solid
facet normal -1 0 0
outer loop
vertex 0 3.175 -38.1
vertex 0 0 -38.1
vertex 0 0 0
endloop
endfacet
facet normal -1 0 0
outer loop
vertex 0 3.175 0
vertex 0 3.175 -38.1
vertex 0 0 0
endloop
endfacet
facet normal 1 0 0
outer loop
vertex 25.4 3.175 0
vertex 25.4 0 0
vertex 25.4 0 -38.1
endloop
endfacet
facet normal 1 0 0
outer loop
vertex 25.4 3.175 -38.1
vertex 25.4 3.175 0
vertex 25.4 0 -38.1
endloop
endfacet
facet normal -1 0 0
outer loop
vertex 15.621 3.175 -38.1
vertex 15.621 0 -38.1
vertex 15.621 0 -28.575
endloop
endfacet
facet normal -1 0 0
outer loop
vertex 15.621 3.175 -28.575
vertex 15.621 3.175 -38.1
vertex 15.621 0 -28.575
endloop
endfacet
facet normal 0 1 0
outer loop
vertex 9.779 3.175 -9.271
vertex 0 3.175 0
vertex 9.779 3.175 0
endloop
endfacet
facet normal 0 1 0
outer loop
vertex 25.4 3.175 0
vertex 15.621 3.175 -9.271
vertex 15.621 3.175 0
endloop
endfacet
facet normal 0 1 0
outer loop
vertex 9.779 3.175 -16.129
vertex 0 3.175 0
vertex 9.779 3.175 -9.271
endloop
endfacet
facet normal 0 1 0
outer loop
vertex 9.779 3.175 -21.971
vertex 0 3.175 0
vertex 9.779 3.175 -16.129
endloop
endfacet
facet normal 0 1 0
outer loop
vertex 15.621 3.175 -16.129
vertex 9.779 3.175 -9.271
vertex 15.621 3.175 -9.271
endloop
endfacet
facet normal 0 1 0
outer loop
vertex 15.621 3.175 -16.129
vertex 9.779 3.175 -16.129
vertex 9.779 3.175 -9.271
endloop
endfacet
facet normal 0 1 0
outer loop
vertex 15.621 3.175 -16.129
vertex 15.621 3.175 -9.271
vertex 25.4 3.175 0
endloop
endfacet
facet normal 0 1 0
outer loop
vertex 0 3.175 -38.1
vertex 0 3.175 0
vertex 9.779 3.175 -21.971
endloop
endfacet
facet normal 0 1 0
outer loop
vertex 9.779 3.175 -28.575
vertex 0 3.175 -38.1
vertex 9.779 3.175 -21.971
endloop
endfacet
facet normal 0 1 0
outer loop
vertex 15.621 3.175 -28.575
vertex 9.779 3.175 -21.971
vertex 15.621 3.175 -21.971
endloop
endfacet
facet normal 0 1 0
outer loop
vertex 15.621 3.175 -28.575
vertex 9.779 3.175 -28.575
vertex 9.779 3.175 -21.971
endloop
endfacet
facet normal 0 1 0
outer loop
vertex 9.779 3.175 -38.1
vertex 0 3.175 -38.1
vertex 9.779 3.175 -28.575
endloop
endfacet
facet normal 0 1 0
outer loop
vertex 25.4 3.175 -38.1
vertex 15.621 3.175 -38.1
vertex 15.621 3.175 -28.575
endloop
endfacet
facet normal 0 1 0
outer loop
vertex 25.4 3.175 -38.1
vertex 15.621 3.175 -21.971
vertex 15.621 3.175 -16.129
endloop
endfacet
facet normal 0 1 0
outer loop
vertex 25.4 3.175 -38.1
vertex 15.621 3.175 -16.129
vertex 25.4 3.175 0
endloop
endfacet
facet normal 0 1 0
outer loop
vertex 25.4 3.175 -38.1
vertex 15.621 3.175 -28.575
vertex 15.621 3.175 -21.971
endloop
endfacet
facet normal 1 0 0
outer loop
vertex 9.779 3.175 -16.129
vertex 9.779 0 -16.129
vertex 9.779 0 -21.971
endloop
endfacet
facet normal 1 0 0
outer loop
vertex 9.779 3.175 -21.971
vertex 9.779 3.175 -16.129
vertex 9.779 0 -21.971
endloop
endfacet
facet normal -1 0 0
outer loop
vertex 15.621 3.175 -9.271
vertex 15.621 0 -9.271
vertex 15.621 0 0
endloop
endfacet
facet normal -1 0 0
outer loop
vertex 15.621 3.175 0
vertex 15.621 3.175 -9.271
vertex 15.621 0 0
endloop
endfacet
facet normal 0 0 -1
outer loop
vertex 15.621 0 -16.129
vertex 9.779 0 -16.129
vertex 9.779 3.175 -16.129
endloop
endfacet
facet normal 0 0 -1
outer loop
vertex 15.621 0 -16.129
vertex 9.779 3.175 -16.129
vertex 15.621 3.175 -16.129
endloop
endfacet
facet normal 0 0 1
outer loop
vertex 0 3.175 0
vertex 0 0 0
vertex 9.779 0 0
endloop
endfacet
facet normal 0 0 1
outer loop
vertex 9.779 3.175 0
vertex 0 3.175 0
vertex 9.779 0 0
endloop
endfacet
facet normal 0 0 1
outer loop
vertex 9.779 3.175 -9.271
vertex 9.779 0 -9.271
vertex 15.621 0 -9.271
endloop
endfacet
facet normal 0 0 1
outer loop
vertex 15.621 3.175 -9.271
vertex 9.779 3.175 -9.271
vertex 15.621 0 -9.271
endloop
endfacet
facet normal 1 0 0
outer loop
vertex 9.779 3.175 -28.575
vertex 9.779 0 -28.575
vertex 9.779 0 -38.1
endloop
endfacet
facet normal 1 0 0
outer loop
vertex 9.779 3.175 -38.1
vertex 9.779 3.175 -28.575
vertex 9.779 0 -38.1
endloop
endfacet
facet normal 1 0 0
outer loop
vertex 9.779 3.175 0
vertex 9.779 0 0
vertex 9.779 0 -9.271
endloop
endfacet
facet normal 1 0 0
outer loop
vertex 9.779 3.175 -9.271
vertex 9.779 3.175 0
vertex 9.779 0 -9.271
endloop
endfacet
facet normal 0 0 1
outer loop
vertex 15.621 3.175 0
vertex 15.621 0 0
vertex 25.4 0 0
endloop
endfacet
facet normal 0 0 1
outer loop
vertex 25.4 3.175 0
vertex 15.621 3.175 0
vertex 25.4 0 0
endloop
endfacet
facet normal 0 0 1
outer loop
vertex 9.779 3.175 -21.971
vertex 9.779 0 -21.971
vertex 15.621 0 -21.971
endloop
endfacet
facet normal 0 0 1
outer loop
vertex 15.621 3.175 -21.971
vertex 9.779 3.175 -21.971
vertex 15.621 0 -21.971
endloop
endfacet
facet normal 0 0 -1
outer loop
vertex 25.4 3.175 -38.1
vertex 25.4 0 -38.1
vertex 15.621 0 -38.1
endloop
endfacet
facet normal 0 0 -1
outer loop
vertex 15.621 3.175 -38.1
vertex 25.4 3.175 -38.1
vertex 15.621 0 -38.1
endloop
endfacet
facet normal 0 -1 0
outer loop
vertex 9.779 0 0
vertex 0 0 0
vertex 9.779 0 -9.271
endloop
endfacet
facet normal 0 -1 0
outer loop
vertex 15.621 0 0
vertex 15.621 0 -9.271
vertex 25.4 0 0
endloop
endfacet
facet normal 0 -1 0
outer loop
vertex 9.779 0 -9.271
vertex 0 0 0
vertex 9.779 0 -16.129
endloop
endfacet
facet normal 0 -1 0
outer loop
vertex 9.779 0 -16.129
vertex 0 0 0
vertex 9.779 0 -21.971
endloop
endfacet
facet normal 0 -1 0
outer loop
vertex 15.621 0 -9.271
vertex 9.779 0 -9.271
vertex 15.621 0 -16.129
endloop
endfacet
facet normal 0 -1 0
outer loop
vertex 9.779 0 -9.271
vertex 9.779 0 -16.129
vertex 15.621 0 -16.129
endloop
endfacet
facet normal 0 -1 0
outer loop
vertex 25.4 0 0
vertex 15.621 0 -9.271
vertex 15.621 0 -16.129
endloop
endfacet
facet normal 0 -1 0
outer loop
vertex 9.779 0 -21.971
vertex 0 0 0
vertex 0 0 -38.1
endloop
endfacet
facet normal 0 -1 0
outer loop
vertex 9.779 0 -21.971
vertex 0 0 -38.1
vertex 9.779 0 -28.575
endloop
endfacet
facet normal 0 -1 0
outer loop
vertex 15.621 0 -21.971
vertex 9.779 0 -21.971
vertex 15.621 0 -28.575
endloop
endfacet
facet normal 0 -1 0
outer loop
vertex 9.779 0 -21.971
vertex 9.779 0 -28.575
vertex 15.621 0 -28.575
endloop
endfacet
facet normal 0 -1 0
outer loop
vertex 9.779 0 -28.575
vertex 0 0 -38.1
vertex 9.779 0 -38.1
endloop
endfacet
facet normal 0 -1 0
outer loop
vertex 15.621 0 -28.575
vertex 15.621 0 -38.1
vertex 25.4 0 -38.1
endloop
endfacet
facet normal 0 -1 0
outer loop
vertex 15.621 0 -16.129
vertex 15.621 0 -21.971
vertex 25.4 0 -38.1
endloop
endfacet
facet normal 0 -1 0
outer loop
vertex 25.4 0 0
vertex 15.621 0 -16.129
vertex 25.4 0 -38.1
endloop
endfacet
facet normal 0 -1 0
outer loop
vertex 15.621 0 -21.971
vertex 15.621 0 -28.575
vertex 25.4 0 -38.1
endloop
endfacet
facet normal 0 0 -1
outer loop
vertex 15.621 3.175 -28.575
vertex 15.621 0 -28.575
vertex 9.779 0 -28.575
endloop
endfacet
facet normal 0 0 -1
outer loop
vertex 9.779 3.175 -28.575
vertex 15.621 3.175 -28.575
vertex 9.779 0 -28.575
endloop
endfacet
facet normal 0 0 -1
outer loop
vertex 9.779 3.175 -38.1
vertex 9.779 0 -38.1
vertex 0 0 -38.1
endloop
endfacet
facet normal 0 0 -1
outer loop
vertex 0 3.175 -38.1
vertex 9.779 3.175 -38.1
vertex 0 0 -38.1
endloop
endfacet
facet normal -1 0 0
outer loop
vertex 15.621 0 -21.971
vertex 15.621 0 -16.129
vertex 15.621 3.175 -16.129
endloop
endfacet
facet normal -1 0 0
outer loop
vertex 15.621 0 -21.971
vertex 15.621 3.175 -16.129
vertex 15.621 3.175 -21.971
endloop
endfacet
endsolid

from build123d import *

# Parameters (mm, degrees)
SKETCH1_W           = 5.842
SKETCH1_H           = 5.842
BOSS_EXTRUDE1_DEPTH = 3.175


with BuildPart() as part:
    # Sketch1 → Boss-Extrude1 (new body)
    with BuildSketch(Plane(origin=(0, 0, 0), x_dir=(1, 0, 0), z_dir=(0, 1, 0))):
        Polygon((9.779, 38.1), (0, 38.1), (0, 0), (9.779, 0), (9.779, 9.271), (15.621, 9.271), (15.621, 0), (25.4, 0), (25.4, 38.1), (15.621, 38.1), (15.621, 28.575), (9.779, 28.575), align=None)
        with Locations((12.7, 19.05)):
            Rectangle(SKETCH1_W, SKETCH1_H, mode=Mode.SUBTRACT)
    extrude(amount=BOSS_EXTRUDE1_DEPTH)


solid = part.part
